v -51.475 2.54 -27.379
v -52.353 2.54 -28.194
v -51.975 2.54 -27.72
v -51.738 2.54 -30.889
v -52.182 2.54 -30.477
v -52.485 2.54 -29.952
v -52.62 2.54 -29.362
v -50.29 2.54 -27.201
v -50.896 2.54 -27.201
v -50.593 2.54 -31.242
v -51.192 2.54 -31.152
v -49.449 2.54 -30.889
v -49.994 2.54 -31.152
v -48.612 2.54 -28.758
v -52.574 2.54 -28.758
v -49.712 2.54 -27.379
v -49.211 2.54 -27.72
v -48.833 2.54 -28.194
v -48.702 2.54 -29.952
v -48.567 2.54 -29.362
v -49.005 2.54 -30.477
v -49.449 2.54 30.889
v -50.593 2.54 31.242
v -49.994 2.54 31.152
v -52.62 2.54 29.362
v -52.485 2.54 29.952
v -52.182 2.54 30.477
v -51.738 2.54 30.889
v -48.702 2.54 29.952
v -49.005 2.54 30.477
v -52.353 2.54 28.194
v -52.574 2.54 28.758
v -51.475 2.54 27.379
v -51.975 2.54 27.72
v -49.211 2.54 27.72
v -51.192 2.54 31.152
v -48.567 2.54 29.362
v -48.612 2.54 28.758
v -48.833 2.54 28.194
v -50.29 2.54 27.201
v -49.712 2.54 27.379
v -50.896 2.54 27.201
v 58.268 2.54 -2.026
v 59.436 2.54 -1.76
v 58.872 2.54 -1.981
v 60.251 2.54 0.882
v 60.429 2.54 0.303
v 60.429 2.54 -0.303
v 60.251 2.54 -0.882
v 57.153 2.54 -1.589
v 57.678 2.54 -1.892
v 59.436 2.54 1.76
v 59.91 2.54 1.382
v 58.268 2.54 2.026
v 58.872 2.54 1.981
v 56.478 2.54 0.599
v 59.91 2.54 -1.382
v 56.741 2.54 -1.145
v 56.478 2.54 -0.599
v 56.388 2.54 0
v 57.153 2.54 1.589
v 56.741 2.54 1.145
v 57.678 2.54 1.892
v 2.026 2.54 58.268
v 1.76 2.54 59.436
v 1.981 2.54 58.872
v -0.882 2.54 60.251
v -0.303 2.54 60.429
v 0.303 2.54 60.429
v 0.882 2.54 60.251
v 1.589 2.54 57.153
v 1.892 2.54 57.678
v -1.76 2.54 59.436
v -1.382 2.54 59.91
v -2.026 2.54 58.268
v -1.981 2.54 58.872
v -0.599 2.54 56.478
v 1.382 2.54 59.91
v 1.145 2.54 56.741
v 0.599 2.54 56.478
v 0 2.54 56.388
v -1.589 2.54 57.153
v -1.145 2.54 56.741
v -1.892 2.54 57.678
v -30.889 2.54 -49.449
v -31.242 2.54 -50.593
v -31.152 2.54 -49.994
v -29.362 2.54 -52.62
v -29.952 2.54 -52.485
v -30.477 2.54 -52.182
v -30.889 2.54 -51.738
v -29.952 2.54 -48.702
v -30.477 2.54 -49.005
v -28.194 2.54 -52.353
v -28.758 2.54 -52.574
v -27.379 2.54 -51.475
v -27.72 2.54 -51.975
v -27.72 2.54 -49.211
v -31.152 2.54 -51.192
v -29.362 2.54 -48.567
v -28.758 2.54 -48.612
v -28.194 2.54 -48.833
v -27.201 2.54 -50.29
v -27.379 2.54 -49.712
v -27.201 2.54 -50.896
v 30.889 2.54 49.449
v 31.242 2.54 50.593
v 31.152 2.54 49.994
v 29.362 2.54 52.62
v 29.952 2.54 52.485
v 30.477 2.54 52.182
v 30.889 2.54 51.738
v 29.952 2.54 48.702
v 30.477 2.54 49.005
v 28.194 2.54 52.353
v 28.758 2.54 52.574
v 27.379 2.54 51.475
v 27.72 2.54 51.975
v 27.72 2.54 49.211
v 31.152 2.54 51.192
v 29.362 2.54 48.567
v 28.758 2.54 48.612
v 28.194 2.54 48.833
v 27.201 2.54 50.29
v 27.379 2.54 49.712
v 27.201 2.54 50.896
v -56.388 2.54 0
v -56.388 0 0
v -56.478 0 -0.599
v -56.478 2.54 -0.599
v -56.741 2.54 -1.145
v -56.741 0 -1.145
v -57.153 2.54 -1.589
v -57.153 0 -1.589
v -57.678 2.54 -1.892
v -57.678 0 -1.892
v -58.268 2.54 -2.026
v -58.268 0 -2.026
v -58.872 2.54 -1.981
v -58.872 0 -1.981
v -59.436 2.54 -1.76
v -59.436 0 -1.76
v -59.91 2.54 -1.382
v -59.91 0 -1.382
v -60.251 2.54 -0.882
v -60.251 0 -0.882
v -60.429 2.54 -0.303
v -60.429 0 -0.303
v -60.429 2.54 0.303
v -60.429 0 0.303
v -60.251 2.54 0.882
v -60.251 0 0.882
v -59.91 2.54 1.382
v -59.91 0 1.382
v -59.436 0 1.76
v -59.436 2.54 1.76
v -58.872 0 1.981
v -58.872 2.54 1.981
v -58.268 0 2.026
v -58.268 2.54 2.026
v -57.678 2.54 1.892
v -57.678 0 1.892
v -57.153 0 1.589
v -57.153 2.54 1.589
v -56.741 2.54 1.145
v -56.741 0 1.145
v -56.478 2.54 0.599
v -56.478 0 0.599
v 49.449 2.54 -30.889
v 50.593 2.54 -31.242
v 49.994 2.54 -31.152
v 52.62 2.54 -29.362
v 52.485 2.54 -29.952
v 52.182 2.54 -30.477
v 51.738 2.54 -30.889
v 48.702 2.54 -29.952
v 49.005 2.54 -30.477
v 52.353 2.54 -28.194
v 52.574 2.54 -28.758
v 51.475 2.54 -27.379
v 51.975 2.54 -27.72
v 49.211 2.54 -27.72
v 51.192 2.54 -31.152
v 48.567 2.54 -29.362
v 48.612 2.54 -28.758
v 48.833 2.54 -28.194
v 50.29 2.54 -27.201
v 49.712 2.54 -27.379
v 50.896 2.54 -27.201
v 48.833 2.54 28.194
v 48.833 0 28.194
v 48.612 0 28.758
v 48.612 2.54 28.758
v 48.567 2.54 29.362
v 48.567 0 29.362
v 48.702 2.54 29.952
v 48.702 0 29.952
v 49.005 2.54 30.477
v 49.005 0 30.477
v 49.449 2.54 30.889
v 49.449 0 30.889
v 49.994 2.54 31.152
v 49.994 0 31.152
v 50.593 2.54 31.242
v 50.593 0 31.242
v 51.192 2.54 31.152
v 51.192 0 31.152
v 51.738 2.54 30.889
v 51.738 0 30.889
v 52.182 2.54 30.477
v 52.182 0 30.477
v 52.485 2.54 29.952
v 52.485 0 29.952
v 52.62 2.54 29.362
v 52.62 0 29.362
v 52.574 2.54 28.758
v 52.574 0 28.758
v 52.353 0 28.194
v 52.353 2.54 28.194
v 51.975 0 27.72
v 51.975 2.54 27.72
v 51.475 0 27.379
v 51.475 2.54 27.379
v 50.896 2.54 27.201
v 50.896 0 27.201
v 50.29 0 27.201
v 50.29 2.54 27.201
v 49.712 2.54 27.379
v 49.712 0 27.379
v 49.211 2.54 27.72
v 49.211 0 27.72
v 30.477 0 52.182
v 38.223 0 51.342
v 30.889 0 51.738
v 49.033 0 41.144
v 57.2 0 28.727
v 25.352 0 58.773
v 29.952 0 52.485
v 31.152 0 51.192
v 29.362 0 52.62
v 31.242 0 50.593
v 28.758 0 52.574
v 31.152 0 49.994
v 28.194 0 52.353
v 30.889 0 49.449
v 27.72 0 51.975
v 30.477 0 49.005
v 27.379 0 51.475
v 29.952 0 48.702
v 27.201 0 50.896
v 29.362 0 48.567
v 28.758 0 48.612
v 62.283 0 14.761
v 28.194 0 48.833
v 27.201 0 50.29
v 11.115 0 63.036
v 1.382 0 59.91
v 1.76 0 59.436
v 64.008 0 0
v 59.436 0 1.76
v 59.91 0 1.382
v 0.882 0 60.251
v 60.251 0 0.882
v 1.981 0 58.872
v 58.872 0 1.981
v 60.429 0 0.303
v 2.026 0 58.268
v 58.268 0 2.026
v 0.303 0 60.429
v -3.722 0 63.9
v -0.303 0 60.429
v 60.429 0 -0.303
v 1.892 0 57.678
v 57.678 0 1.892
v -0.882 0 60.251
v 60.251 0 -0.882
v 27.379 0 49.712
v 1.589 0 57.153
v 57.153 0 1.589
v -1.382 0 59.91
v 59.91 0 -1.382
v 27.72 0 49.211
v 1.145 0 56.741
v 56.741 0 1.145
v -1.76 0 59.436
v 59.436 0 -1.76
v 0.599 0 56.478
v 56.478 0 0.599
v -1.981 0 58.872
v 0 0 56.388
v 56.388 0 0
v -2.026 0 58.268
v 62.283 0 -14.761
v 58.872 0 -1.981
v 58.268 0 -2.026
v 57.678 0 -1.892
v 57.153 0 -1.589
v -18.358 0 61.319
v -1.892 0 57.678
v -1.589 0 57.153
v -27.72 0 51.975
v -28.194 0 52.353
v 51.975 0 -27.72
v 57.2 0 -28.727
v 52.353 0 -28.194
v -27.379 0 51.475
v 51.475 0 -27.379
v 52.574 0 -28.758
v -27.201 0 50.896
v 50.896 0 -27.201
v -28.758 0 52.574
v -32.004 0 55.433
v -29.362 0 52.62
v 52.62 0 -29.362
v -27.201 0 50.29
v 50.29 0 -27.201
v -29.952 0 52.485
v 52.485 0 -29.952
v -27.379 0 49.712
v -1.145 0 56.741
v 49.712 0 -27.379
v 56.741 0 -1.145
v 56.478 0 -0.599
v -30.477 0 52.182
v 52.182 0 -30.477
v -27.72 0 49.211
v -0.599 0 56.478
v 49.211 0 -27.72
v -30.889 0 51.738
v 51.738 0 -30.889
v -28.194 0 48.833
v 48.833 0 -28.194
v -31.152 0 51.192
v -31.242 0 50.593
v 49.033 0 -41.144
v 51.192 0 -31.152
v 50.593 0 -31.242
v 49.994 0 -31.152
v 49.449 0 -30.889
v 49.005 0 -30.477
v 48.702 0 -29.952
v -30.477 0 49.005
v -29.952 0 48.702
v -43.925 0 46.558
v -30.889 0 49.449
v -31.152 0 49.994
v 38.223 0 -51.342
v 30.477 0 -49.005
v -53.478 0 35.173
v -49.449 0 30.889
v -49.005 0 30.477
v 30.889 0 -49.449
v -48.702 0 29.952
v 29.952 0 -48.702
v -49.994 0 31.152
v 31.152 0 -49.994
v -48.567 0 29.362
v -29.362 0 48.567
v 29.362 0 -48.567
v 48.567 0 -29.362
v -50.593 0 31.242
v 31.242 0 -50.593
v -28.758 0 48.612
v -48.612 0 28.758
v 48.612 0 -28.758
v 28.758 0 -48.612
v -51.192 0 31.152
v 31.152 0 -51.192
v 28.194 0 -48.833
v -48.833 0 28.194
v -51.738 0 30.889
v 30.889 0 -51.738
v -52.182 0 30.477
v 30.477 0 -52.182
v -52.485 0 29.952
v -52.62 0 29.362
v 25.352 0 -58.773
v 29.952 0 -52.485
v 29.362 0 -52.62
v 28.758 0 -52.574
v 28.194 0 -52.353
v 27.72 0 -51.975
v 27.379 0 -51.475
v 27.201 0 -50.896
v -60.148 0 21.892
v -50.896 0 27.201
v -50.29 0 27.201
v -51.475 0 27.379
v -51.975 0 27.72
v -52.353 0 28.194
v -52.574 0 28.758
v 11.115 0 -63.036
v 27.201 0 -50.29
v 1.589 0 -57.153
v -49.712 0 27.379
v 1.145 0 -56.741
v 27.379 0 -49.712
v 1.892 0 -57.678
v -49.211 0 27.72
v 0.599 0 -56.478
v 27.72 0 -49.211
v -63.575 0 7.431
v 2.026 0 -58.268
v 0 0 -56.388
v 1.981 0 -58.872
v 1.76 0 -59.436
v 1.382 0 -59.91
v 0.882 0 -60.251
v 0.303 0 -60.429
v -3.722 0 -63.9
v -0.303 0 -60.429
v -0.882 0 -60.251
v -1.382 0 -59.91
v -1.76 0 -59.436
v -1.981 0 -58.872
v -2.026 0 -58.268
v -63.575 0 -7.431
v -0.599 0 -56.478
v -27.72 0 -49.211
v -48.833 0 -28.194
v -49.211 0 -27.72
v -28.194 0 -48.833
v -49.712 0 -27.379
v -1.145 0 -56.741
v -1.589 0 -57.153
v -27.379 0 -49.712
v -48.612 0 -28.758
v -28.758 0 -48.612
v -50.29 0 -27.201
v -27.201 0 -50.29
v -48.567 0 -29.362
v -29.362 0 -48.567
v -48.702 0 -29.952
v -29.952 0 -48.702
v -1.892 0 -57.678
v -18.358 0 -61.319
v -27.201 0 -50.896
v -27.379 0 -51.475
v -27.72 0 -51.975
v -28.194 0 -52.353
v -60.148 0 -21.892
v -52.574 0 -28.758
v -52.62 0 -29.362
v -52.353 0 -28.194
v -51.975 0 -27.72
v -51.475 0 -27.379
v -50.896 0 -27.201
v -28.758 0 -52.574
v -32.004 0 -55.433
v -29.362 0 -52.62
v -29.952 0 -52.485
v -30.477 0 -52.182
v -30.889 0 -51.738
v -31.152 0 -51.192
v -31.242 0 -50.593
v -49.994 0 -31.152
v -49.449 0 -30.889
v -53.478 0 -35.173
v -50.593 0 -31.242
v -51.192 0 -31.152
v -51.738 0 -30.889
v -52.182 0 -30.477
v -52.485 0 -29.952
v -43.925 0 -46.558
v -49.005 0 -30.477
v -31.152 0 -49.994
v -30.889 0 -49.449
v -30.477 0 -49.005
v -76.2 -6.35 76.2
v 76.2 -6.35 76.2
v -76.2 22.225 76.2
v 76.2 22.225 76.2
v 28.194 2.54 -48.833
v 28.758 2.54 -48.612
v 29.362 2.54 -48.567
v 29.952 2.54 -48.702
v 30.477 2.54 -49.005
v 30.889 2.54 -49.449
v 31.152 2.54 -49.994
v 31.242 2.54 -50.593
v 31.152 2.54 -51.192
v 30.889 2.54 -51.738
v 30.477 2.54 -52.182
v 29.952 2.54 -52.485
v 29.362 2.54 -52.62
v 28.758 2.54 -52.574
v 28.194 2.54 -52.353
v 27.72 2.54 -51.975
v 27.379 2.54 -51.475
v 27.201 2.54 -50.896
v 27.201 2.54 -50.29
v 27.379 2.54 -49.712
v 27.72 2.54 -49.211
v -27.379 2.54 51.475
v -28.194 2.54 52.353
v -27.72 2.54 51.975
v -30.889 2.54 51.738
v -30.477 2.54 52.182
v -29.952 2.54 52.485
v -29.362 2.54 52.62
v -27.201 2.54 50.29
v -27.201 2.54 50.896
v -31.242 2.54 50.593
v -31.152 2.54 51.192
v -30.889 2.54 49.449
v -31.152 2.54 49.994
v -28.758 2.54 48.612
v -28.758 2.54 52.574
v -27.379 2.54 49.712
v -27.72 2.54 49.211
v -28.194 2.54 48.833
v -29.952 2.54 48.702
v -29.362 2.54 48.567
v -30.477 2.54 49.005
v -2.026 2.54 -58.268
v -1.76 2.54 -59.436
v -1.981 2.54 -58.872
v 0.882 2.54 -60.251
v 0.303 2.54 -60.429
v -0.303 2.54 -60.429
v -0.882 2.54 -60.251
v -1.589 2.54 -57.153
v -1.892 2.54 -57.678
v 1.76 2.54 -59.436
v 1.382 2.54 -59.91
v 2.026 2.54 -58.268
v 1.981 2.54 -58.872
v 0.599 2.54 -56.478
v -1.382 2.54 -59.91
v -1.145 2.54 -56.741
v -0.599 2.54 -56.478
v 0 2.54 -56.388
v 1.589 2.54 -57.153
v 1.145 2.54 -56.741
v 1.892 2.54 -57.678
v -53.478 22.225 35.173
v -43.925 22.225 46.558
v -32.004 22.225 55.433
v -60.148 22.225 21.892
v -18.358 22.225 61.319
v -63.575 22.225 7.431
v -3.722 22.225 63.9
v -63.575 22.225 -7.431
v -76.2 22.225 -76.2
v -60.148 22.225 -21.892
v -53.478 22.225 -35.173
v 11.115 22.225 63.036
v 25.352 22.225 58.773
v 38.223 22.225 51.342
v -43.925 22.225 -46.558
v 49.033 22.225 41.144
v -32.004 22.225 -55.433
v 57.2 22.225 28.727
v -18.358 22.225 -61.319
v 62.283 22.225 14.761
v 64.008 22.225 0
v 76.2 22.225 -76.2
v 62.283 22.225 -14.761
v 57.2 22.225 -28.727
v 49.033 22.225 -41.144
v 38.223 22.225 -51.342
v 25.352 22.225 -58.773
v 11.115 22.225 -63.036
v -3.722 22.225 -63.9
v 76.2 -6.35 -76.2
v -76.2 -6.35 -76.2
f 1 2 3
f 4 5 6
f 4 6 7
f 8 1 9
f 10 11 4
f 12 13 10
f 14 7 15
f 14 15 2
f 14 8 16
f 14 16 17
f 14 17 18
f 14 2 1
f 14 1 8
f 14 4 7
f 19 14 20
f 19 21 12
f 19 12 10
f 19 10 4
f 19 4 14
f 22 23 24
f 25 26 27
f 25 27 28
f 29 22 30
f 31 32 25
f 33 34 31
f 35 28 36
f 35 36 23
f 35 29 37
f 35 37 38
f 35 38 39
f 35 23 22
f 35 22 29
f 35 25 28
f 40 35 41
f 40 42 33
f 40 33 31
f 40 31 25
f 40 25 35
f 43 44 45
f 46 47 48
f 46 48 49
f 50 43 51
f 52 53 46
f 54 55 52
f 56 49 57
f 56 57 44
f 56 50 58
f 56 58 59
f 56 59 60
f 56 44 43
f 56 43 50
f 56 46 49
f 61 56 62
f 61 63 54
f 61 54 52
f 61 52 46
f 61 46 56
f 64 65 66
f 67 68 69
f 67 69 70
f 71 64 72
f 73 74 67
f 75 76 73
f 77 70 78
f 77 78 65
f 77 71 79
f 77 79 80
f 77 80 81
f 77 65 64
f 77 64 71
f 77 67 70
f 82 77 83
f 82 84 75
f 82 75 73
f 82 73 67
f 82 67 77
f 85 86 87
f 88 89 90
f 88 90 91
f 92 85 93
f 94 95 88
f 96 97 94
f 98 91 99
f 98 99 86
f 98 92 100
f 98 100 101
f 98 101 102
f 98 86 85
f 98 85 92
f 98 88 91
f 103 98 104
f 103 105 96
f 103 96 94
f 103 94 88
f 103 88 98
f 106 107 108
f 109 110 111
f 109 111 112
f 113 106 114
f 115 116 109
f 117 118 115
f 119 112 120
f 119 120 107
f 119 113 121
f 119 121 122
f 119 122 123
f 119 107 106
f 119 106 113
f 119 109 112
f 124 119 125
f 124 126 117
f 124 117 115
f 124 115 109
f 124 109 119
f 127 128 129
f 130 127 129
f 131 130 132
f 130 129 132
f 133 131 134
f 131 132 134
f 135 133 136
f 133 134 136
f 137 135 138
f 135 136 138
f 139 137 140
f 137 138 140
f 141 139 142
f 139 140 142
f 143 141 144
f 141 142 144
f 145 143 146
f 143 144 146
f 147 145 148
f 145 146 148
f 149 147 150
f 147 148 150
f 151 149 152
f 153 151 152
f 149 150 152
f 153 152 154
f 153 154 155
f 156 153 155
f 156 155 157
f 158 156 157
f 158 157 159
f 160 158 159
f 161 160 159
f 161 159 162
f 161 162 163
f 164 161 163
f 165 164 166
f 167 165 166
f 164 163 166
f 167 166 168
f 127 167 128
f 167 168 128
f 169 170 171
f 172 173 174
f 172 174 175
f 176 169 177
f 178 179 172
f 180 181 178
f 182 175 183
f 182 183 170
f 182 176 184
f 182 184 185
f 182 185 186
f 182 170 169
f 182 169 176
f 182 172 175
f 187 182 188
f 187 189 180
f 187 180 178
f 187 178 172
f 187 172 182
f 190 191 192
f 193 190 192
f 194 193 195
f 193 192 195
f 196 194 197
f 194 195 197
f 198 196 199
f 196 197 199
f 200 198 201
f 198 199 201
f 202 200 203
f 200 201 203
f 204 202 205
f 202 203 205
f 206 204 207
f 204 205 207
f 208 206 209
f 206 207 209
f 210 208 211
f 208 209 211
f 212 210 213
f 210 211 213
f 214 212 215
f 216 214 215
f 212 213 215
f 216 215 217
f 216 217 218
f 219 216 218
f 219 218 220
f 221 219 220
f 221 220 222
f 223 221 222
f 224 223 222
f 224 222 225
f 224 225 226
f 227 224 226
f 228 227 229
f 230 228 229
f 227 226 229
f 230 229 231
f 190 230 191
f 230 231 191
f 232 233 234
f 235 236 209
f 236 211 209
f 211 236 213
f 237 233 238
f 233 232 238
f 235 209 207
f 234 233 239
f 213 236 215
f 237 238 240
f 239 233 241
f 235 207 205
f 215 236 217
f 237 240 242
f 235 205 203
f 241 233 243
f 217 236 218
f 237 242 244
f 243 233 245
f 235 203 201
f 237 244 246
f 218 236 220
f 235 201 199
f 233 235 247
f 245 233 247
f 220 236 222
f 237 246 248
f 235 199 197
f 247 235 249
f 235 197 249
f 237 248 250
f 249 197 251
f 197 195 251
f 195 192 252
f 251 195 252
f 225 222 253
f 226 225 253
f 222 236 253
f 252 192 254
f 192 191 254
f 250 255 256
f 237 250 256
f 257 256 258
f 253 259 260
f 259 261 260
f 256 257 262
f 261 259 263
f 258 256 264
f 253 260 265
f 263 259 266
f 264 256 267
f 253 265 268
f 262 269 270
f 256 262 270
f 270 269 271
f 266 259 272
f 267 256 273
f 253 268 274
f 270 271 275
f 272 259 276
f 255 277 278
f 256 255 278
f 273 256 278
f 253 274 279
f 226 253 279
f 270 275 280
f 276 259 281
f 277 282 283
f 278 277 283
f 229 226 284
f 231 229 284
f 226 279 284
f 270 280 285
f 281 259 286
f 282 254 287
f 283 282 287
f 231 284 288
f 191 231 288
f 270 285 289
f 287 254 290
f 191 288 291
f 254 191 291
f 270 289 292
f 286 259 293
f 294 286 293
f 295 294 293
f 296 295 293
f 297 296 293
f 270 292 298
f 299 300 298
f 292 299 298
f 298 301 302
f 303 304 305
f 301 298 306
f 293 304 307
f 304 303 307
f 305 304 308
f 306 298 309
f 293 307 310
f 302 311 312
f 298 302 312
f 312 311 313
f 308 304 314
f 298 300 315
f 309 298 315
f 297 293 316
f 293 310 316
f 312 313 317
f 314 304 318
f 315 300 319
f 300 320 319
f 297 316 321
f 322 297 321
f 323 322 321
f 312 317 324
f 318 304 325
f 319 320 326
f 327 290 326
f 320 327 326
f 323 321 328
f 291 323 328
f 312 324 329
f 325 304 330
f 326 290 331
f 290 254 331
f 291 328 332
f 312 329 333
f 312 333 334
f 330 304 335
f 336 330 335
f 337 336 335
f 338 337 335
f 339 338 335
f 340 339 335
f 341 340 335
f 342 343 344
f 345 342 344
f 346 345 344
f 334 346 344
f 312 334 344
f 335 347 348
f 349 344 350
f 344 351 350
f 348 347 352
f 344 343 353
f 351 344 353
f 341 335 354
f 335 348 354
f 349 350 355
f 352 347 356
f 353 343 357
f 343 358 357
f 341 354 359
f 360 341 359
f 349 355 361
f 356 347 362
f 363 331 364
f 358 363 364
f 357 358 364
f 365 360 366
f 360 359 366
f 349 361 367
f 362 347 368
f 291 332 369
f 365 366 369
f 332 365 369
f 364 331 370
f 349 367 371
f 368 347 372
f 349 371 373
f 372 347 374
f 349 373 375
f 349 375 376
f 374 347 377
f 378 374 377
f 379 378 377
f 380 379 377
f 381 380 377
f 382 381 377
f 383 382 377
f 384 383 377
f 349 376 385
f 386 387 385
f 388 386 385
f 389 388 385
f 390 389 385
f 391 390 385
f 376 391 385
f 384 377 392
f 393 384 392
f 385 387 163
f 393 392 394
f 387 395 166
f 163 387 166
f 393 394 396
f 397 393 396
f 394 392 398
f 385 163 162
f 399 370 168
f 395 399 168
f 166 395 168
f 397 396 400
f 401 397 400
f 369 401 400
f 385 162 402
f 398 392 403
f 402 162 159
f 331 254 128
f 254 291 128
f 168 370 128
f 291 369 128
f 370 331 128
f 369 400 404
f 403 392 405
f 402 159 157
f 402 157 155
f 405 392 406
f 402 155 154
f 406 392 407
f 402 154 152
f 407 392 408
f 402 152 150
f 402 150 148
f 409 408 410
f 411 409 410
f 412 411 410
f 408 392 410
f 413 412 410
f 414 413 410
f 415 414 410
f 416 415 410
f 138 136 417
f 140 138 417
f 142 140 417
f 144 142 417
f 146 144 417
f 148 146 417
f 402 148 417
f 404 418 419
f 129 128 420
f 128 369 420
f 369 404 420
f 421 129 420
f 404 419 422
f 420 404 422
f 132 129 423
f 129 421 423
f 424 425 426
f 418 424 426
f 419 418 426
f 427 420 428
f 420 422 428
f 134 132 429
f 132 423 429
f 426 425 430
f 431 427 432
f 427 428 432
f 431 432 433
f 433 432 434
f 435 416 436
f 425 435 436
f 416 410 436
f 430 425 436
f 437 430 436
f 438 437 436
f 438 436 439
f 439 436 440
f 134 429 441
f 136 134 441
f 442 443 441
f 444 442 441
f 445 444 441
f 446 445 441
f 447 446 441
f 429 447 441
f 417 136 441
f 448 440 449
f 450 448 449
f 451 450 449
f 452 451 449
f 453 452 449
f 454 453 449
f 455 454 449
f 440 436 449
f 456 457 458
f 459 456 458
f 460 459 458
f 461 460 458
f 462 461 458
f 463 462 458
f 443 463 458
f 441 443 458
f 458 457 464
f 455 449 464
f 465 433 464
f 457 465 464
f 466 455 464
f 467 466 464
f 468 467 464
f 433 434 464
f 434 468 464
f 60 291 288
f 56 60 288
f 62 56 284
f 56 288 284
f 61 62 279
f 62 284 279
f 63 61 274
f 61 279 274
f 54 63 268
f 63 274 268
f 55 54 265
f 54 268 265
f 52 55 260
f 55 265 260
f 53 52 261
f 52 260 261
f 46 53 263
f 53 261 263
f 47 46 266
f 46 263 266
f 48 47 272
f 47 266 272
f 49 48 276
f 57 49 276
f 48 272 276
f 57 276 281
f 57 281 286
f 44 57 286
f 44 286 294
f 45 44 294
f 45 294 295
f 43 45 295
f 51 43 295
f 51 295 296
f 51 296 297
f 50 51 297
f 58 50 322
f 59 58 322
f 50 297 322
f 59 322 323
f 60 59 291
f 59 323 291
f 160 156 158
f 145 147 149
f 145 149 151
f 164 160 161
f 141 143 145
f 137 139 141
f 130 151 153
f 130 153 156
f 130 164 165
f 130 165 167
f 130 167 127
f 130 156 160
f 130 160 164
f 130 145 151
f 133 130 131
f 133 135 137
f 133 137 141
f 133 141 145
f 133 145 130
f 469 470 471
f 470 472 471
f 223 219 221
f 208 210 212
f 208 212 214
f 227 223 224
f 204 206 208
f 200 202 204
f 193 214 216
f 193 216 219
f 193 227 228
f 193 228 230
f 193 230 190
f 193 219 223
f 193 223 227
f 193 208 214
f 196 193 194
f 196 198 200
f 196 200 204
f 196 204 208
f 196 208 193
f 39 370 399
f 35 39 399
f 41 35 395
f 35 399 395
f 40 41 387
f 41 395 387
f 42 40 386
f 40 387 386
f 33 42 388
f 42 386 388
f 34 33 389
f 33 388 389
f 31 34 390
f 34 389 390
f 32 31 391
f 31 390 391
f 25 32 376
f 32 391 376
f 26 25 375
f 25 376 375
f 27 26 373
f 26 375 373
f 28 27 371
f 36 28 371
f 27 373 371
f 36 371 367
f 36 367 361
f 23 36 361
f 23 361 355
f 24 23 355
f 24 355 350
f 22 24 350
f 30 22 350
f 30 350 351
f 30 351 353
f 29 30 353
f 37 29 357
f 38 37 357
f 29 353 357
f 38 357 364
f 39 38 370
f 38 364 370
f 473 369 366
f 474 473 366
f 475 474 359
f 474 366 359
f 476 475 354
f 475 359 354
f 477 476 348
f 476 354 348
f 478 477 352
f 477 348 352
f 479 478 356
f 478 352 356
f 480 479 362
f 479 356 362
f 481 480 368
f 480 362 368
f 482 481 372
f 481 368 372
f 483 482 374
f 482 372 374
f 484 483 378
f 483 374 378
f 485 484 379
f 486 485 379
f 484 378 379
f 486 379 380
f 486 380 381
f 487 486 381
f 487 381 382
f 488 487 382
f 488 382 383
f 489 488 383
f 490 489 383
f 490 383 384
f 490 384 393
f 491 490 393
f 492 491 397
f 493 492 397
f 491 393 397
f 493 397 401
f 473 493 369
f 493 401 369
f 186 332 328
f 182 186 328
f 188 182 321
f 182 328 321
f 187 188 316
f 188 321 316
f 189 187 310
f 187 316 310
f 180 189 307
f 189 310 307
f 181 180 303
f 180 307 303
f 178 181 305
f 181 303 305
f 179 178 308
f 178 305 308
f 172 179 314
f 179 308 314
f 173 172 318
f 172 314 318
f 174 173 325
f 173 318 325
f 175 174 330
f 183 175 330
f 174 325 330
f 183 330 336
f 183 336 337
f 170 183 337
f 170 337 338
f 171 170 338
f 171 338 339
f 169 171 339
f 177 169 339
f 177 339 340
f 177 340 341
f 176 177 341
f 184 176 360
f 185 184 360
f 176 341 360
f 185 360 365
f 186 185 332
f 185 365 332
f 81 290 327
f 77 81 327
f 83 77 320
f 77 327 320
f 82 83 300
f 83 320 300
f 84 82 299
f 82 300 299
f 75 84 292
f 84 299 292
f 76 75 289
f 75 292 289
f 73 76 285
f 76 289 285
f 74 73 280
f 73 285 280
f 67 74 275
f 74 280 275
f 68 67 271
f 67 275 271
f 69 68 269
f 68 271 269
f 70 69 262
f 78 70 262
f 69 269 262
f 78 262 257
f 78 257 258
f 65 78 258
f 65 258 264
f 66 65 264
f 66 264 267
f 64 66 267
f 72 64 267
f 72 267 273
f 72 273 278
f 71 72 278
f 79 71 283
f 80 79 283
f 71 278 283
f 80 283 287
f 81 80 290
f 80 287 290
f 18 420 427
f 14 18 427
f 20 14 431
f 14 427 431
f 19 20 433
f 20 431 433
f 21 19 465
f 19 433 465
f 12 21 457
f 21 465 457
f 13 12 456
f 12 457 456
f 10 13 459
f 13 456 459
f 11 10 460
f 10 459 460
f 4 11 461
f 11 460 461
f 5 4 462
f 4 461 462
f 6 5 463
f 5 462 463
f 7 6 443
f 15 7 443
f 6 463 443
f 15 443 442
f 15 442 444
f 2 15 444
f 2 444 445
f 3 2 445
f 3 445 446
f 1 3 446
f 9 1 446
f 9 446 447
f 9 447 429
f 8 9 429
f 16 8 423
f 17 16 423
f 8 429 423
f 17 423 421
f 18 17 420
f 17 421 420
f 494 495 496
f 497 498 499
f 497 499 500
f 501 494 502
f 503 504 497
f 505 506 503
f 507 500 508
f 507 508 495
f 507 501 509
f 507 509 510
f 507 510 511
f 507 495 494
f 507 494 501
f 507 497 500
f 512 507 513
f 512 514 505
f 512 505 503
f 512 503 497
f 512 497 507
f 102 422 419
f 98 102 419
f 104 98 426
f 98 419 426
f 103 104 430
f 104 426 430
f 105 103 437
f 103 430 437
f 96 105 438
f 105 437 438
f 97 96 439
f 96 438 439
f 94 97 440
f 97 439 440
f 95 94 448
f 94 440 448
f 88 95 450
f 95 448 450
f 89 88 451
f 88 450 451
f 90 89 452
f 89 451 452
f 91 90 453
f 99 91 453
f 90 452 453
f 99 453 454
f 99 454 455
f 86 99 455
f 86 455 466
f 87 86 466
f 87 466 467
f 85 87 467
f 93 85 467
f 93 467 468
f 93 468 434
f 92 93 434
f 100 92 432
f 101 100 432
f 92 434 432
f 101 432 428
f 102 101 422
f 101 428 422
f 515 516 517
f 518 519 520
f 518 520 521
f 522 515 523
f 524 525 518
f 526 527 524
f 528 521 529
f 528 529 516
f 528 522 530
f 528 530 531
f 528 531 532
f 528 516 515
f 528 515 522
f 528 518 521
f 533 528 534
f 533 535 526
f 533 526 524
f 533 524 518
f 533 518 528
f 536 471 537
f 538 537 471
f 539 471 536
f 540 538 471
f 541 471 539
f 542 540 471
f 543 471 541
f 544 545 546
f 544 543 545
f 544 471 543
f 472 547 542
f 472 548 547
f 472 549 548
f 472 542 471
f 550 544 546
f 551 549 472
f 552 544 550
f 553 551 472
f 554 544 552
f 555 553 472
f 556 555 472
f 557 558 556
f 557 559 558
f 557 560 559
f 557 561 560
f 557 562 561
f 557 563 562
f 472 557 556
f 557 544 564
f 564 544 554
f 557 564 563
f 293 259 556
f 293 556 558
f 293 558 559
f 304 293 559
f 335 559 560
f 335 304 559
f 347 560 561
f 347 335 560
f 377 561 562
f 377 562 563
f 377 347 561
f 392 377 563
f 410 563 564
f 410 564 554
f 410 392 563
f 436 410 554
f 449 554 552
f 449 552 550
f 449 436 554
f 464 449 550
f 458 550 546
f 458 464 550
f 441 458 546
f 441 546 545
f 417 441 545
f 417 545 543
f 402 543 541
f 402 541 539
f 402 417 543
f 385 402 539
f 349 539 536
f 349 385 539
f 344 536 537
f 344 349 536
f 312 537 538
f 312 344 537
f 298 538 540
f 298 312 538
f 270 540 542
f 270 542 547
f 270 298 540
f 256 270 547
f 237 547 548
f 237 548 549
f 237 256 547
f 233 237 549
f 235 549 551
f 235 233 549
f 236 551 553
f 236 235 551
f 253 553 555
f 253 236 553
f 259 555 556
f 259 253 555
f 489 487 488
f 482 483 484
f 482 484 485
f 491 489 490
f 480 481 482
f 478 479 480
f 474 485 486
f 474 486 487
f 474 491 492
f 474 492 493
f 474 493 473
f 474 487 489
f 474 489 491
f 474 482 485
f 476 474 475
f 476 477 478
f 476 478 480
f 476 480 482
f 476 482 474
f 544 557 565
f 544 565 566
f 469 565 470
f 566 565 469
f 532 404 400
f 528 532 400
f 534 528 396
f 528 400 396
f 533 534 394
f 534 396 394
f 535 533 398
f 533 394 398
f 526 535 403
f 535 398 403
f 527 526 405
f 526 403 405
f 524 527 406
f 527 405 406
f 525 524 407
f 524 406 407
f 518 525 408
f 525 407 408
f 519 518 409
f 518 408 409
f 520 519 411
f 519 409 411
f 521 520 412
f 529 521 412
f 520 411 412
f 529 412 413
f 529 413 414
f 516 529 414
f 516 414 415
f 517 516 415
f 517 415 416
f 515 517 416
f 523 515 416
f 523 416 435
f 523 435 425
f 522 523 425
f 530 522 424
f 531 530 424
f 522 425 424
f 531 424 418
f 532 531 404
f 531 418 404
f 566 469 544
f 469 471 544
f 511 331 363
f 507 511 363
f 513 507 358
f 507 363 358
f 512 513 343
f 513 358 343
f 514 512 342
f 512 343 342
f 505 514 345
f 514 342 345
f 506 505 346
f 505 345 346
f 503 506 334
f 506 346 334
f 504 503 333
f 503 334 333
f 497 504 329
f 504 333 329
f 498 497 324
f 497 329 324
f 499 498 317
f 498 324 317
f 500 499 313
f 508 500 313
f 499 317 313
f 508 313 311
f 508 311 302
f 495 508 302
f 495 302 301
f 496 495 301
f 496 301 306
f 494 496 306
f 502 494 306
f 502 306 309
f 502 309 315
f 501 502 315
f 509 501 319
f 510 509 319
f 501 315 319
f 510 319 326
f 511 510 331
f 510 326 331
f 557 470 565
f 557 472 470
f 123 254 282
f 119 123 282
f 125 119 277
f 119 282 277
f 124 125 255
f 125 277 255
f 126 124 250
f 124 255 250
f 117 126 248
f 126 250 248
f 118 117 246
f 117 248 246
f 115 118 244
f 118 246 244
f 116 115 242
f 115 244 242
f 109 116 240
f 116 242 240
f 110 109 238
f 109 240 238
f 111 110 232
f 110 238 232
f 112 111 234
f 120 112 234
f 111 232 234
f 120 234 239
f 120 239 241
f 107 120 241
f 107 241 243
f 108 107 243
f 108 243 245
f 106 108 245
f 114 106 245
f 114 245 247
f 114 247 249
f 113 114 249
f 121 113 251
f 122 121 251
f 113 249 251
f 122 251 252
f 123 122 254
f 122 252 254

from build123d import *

# Parameters (mm, degrees)
SKETCH1_W           = 152.4
SKETCH1_H           = 152.4
SKETCH1_R           = 64.008
BOSS_EXTRUDE1_DEPTH = 22.225
SKETCH2_W           = 152.4
SKETCH2_H           = 152.4
BOSS_EXTRUDE2_DEPTH = 6.35
SKETCH3_R           = 2.032
BOSS_EXTRUDE3_DEPTH = 2.54
CIRPATTERN1_COUNT   = 12


with BuildPart() as part:
    # Sketch1 → Boss-Extrude1 (new body)
    with BuildSketch(Plane(origin=(0, 0, 0), x_dir=(1, 0, 0), z_dir=(0, 1, 0))):
        Rectangle(SKETCH1_W, SKETCH1_H)
        Circle(SKETCH1_R, mode=Mode.SUBTRACT)
    extrude(amount=BOSS_EXTRUDE1_DEPTH)

    # Sketch2 → Boss-Extrude2 (add)
    with BuildSketch(Plane(origin=(0, 0, 0), x_dir=(-1, 0, 0), z_dir=(0, -1, 0))):
        Rectangle(SKETCH2_W, SKETCH2_H)
    extrude(amount=BOSS_EXTRUDE2_DEPTH)

    # Sketch3 → Boss-Extrude3 (add)
    with BuildSketch(Plane(origin=(0, 0, 0), x_dir=(1, 0, 0), z_dir=(0, 1, 0))):
        with Locations((-58.42, 0)):
            Circle(SKETCH3_R)
    boss_extrude3 = extrude(amount=BOSS_EXTRUDE3_DEPTH)

    # CirPattern1: Boss-Extrude3 ×12 about axis
    cirpattern1_axis = Axis((0, 0, 0), (0, 1, 0))
    for i in range(1, CIRPATTERN1_COUNT):
        add(boss_extrude3.rotate(cirpattern1_axis, i * 360 / CIRPATTERN1_COUNT))


solid = part.part
